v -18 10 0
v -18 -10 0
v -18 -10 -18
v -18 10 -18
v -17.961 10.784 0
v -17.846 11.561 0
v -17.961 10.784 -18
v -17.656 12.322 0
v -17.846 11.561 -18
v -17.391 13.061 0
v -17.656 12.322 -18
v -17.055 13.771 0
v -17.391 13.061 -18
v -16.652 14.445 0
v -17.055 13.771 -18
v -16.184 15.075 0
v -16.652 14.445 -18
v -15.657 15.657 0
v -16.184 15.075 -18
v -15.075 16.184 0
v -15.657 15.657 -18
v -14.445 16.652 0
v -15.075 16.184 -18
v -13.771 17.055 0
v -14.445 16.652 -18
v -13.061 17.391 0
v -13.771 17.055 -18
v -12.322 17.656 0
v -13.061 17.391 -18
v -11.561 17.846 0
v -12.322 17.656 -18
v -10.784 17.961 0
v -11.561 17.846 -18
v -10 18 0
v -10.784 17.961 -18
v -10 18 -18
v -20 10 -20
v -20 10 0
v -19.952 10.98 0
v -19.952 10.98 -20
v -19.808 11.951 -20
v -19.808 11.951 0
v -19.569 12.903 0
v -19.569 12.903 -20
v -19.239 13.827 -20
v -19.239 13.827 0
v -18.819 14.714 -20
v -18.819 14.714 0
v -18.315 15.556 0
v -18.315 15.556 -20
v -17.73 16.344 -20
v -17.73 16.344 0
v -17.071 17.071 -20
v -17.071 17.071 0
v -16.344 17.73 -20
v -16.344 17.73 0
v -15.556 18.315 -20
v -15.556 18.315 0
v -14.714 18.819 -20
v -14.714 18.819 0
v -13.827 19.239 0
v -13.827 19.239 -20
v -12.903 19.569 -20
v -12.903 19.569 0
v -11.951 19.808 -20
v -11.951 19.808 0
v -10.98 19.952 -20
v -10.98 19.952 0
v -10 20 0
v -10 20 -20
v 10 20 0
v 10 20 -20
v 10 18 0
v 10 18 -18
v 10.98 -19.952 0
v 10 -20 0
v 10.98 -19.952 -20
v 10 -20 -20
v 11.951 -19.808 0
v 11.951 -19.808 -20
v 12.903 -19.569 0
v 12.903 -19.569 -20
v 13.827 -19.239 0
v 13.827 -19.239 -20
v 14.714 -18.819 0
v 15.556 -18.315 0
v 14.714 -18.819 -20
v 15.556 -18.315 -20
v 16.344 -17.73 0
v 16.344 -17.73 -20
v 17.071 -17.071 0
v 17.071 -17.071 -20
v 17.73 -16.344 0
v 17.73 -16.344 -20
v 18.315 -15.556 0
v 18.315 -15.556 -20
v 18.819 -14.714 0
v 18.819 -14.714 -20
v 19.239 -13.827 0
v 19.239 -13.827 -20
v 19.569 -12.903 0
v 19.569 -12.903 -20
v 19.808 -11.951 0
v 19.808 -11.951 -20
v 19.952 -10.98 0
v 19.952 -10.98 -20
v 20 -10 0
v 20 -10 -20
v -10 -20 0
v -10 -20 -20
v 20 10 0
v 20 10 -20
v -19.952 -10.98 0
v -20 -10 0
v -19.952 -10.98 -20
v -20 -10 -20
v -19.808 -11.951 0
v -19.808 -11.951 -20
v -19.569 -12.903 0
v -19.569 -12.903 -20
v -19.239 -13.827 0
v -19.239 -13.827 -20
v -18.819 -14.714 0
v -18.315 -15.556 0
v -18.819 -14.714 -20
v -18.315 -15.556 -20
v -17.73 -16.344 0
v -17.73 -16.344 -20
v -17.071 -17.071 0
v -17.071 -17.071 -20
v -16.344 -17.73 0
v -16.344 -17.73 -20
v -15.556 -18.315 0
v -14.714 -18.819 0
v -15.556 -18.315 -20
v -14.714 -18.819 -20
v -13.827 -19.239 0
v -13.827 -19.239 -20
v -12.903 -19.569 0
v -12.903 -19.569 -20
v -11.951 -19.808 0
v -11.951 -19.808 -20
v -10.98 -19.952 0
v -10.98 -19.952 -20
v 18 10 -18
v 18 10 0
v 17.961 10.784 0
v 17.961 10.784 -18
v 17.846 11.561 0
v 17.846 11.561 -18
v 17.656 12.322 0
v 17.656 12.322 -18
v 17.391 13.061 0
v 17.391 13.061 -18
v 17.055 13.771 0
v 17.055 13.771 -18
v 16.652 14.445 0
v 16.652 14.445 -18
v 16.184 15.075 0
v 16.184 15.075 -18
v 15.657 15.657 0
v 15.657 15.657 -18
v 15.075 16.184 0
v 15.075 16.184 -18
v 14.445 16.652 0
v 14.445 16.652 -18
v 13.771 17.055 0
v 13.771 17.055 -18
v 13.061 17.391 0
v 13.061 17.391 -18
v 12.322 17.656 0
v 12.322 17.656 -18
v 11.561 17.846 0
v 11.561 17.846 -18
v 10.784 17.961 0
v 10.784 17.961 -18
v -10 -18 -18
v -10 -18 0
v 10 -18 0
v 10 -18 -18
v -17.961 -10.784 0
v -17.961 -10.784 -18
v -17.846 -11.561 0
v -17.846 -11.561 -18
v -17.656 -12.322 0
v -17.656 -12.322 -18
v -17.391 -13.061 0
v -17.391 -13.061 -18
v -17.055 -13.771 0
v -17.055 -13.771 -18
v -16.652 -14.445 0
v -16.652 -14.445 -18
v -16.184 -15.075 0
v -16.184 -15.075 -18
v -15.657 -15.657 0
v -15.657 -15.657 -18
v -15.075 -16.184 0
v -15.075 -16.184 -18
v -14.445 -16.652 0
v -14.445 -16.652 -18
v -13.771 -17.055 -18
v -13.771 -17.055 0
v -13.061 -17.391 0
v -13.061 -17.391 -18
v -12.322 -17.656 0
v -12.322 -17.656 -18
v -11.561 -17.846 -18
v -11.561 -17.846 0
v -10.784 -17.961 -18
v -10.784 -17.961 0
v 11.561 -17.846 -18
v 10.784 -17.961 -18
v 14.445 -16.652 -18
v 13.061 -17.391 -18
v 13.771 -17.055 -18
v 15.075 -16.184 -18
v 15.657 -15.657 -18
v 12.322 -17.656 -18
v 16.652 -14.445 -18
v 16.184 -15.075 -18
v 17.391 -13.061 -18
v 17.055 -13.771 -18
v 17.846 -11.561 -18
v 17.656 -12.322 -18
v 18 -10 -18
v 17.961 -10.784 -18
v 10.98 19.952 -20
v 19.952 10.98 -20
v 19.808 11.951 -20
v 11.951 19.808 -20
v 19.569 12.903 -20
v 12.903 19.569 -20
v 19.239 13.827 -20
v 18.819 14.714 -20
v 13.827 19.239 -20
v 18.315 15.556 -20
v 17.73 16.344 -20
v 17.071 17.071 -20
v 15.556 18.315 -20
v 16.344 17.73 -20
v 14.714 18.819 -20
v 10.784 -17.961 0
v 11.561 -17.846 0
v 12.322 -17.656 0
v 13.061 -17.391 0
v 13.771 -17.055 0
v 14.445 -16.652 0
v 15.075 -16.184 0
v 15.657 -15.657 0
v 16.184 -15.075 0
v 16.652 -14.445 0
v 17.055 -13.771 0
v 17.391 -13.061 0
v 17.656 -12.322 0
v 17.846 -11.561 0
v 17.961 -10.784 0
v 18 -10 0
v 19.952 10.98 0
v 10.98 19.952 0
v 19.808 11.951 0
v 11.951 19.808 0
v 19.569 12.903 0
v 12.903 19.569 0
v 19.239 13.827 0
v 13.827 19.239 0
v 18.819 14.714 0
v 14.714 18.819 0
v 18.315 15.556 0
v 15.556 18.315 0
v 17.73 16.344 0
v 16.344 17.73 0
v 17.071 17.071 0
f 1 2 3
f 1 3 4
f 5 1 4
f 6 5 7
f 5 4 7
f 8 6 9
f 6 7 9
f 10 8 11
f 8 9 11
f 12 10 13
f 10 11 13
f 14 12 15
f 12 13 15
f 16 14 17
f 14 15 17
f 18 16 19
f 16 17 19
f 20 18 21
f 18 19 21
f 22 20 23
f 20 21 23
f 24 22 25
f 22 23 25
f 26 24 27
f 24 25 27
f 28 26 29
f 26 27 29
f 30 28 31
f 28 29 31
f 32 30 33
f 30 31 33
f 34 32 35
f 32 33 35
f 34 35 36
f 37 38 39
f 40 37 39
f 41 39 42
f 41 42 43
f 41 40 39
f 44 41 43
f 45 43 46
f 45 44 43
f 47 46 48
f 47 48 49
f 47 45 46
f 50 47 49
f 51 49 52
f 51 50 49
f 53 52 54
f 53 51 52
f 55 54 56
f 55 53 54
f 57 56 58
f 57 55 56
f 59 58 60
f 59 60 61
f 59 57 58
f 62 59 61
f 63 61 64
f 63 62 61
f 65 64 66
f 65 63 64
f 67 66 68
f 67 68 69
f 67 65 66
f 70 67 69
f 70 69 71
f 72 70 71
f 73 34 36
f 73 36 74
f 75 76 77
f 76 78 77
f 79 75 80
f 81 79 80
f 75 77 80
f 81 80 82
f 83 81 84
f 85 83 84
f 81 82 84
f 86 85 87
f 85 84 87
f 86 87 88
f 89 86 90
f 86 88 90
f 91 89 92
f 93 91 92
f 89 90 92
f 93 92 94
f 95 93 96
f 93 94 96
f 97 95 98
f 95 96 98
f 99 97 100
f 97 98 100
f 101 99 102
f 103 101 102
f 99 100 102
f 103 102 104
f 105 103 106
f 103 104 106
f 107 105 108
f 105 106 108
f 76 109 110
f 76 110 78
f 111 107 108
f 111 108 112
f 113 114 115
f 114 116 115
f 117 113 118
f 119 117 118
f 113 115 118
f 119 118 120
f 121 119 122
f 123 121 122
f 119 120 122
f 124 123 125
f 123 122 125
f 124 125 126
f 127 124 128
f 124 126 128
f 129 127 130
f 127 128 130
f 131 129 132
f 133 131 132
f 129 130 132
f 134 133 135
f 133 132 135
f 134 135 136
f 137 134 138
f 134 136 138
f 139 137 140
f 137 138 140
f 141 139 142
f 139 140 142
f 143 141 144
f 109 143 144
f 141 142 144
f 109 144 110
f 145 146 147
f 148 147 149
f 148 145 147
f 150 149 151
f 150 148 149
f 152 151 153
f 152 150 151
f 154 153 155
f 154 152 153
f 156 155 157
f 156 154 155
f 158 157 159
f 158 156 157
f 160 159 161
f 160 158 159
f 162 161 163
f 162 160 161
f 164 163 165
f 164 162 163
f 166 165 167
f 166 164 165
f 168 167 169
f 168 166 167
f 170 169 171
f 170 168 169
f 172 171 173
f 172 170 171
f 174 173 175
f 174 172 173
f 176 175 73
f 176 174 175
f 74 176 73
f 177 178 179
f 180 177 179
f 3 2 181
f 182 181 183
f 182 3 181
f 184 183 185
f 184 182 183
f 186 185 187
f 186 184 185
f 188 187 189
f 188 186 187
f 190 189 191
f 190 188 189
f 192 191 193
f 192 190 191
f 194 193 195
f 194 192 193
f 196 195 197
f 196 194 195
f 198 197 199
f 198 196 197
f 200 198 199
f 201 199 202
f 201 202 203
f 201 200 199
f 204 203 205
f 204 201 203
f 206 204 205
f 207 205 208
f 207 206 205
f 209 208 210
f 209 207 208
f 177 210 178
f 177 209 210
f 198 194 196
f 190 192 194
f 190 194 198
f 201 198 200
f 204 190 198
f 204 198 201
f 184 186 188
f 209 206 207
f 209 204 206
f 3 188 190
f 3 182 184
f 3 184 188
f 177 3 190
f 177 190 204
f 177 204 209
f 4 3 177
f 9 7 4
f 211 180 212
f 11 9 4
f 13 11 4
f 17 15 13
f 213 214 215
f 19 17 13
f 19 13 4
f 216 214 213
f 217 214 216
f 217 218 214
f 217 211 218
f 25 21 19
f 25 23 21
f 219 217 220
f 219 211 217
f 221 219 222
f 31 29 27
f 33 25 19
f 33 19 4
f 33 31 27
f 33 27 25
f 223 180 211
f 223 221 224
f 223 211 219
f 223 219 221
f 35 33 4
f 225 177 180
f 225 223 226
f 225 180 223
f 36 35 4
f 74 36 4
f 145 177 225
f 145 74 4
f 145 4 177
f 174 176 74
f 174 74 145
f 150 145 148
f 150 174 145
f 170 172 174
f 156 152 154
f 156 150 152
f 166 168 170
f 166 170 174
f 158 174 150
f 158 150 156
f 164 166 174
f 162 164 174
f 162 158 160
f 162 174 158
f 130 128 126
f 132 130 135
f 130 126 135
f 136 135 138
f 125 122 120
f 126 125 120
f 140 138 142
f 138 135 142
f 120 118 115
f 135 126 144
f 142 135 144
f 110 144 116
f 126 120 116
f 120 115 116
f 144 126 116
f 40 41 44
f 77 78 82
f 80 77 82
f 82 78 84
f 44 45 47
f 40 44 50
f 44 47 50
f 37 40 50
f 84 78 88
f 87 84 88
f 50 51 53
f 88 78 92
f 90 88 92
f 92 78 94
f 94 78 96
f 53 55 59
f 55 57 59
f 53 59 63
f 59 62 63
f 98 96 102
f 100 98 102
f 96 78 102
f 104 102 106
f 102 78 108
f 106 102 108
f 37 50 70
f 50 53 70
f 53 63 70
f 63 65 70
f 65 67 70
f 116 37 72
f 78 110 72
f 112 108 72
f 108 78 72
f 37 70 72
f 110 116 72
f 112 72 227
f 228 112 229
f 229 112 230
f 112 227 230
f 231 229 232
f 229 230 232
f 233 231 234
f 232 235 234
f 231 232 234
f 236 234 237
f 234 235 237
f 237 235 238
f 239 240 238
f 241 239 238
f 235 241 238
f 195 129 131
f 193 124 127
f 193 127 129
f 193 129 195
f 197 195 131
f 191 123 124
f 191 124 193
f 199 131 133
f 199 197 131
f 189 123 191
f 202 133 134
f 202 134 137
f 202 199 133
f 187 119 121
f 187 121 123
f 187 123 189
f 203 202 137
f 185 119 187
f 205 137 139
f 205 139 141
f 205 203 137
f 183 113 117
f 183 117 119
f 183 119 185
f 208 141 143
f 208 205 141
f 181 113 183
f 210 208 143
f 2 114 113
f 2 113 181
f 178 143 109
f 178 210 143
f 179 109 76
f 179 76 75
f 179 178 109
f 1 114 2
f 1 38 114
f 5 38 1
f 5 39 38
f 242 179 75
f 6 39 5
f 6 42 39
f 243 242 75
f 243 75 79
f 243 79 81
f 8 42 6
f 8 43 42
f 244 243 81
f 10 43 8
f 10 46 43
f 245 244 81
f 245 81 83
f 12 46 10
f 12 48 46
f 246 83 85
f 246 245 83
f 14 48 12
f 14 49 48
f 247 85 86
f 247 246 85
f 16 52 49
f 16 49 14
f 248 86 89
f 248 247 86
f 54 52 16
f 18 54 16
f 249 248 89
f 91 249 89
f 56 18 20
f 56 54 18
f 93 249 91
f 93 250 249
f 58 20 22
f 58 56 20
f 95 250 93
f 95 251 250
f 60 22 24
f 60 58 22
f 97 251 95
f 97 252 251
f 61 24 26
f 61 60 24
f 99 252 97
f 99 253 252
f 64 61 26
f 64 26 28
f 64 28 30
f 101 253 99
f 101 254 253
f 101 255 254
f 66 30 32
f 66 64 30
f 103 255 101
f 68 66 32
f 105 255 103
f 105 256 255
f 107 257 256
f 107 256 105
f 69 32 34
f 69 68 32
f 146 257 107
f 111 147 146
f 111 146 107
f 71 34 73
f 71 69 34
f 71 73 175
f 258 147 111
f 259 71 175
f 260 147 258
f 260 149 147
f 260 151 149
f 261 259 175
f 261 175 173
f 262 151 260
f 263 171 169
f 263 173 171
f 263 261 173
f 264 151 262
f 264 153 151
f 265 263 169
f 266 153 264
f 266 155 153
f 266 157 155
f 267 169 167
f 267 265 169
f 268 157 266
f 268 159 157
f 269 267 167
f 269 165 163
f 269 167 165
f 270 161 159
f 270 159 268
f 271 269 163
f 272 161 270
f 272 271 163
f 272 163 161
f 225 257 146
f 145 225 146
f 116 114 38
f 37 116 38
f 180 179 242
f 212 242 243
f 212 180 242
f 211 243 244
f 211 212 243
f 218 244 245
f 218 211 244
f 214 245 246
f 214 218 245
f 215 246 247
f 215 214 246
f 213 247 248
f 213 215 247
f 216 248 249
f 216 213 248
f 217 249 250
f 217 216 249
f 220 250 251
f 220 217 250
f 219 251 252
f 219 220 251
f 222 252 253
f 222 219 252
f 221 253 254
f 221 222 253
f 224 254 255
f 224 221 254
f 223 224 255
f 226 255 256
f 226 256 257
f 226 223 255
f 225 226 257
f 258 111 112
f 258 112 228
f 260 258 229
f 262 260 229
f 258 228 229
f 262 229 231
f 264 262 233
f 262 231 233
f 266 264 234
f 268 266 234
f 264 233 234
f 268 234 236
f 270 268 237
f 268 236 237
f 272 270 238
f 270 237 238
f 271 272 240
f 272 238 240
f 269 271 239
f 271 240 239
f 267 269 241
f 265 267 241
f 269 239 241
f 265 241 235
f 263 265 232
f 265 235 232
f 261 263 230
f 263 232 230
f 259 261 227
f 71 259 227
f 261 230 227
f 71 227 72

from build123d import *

# Parameters (mm, degrees)
F0_W     = 40
F0_H     = 40
F1_DEPTH = 20
F2_R     = 10
F3_T     = -2


with BuildPart() as f1:
    # F0 (on Top) → F1 (new body)
    with BuildSketch(Plane.XY):
        Rectangle(F0_W, F0_H)
    extrude(amount=-F1_DEPTH)

    # F2
    f2_edges = [f1.edges().sort_by_distance(p)[0] for p in [
        (-20, -20, -10),
        (20, -20, -10),
        (20, 20, -10),
        (-20, 20, -10),
    ]]
    fillet(f2_edges, radius=F2_R)

    # F3
    f3_openings = [f1.faces().sort_by_distance(p)[0] for p in [
        (0, 0, 0),
    ]]
    offset(amount=F3_T, openings=f3_openings)


solid = f1.part
